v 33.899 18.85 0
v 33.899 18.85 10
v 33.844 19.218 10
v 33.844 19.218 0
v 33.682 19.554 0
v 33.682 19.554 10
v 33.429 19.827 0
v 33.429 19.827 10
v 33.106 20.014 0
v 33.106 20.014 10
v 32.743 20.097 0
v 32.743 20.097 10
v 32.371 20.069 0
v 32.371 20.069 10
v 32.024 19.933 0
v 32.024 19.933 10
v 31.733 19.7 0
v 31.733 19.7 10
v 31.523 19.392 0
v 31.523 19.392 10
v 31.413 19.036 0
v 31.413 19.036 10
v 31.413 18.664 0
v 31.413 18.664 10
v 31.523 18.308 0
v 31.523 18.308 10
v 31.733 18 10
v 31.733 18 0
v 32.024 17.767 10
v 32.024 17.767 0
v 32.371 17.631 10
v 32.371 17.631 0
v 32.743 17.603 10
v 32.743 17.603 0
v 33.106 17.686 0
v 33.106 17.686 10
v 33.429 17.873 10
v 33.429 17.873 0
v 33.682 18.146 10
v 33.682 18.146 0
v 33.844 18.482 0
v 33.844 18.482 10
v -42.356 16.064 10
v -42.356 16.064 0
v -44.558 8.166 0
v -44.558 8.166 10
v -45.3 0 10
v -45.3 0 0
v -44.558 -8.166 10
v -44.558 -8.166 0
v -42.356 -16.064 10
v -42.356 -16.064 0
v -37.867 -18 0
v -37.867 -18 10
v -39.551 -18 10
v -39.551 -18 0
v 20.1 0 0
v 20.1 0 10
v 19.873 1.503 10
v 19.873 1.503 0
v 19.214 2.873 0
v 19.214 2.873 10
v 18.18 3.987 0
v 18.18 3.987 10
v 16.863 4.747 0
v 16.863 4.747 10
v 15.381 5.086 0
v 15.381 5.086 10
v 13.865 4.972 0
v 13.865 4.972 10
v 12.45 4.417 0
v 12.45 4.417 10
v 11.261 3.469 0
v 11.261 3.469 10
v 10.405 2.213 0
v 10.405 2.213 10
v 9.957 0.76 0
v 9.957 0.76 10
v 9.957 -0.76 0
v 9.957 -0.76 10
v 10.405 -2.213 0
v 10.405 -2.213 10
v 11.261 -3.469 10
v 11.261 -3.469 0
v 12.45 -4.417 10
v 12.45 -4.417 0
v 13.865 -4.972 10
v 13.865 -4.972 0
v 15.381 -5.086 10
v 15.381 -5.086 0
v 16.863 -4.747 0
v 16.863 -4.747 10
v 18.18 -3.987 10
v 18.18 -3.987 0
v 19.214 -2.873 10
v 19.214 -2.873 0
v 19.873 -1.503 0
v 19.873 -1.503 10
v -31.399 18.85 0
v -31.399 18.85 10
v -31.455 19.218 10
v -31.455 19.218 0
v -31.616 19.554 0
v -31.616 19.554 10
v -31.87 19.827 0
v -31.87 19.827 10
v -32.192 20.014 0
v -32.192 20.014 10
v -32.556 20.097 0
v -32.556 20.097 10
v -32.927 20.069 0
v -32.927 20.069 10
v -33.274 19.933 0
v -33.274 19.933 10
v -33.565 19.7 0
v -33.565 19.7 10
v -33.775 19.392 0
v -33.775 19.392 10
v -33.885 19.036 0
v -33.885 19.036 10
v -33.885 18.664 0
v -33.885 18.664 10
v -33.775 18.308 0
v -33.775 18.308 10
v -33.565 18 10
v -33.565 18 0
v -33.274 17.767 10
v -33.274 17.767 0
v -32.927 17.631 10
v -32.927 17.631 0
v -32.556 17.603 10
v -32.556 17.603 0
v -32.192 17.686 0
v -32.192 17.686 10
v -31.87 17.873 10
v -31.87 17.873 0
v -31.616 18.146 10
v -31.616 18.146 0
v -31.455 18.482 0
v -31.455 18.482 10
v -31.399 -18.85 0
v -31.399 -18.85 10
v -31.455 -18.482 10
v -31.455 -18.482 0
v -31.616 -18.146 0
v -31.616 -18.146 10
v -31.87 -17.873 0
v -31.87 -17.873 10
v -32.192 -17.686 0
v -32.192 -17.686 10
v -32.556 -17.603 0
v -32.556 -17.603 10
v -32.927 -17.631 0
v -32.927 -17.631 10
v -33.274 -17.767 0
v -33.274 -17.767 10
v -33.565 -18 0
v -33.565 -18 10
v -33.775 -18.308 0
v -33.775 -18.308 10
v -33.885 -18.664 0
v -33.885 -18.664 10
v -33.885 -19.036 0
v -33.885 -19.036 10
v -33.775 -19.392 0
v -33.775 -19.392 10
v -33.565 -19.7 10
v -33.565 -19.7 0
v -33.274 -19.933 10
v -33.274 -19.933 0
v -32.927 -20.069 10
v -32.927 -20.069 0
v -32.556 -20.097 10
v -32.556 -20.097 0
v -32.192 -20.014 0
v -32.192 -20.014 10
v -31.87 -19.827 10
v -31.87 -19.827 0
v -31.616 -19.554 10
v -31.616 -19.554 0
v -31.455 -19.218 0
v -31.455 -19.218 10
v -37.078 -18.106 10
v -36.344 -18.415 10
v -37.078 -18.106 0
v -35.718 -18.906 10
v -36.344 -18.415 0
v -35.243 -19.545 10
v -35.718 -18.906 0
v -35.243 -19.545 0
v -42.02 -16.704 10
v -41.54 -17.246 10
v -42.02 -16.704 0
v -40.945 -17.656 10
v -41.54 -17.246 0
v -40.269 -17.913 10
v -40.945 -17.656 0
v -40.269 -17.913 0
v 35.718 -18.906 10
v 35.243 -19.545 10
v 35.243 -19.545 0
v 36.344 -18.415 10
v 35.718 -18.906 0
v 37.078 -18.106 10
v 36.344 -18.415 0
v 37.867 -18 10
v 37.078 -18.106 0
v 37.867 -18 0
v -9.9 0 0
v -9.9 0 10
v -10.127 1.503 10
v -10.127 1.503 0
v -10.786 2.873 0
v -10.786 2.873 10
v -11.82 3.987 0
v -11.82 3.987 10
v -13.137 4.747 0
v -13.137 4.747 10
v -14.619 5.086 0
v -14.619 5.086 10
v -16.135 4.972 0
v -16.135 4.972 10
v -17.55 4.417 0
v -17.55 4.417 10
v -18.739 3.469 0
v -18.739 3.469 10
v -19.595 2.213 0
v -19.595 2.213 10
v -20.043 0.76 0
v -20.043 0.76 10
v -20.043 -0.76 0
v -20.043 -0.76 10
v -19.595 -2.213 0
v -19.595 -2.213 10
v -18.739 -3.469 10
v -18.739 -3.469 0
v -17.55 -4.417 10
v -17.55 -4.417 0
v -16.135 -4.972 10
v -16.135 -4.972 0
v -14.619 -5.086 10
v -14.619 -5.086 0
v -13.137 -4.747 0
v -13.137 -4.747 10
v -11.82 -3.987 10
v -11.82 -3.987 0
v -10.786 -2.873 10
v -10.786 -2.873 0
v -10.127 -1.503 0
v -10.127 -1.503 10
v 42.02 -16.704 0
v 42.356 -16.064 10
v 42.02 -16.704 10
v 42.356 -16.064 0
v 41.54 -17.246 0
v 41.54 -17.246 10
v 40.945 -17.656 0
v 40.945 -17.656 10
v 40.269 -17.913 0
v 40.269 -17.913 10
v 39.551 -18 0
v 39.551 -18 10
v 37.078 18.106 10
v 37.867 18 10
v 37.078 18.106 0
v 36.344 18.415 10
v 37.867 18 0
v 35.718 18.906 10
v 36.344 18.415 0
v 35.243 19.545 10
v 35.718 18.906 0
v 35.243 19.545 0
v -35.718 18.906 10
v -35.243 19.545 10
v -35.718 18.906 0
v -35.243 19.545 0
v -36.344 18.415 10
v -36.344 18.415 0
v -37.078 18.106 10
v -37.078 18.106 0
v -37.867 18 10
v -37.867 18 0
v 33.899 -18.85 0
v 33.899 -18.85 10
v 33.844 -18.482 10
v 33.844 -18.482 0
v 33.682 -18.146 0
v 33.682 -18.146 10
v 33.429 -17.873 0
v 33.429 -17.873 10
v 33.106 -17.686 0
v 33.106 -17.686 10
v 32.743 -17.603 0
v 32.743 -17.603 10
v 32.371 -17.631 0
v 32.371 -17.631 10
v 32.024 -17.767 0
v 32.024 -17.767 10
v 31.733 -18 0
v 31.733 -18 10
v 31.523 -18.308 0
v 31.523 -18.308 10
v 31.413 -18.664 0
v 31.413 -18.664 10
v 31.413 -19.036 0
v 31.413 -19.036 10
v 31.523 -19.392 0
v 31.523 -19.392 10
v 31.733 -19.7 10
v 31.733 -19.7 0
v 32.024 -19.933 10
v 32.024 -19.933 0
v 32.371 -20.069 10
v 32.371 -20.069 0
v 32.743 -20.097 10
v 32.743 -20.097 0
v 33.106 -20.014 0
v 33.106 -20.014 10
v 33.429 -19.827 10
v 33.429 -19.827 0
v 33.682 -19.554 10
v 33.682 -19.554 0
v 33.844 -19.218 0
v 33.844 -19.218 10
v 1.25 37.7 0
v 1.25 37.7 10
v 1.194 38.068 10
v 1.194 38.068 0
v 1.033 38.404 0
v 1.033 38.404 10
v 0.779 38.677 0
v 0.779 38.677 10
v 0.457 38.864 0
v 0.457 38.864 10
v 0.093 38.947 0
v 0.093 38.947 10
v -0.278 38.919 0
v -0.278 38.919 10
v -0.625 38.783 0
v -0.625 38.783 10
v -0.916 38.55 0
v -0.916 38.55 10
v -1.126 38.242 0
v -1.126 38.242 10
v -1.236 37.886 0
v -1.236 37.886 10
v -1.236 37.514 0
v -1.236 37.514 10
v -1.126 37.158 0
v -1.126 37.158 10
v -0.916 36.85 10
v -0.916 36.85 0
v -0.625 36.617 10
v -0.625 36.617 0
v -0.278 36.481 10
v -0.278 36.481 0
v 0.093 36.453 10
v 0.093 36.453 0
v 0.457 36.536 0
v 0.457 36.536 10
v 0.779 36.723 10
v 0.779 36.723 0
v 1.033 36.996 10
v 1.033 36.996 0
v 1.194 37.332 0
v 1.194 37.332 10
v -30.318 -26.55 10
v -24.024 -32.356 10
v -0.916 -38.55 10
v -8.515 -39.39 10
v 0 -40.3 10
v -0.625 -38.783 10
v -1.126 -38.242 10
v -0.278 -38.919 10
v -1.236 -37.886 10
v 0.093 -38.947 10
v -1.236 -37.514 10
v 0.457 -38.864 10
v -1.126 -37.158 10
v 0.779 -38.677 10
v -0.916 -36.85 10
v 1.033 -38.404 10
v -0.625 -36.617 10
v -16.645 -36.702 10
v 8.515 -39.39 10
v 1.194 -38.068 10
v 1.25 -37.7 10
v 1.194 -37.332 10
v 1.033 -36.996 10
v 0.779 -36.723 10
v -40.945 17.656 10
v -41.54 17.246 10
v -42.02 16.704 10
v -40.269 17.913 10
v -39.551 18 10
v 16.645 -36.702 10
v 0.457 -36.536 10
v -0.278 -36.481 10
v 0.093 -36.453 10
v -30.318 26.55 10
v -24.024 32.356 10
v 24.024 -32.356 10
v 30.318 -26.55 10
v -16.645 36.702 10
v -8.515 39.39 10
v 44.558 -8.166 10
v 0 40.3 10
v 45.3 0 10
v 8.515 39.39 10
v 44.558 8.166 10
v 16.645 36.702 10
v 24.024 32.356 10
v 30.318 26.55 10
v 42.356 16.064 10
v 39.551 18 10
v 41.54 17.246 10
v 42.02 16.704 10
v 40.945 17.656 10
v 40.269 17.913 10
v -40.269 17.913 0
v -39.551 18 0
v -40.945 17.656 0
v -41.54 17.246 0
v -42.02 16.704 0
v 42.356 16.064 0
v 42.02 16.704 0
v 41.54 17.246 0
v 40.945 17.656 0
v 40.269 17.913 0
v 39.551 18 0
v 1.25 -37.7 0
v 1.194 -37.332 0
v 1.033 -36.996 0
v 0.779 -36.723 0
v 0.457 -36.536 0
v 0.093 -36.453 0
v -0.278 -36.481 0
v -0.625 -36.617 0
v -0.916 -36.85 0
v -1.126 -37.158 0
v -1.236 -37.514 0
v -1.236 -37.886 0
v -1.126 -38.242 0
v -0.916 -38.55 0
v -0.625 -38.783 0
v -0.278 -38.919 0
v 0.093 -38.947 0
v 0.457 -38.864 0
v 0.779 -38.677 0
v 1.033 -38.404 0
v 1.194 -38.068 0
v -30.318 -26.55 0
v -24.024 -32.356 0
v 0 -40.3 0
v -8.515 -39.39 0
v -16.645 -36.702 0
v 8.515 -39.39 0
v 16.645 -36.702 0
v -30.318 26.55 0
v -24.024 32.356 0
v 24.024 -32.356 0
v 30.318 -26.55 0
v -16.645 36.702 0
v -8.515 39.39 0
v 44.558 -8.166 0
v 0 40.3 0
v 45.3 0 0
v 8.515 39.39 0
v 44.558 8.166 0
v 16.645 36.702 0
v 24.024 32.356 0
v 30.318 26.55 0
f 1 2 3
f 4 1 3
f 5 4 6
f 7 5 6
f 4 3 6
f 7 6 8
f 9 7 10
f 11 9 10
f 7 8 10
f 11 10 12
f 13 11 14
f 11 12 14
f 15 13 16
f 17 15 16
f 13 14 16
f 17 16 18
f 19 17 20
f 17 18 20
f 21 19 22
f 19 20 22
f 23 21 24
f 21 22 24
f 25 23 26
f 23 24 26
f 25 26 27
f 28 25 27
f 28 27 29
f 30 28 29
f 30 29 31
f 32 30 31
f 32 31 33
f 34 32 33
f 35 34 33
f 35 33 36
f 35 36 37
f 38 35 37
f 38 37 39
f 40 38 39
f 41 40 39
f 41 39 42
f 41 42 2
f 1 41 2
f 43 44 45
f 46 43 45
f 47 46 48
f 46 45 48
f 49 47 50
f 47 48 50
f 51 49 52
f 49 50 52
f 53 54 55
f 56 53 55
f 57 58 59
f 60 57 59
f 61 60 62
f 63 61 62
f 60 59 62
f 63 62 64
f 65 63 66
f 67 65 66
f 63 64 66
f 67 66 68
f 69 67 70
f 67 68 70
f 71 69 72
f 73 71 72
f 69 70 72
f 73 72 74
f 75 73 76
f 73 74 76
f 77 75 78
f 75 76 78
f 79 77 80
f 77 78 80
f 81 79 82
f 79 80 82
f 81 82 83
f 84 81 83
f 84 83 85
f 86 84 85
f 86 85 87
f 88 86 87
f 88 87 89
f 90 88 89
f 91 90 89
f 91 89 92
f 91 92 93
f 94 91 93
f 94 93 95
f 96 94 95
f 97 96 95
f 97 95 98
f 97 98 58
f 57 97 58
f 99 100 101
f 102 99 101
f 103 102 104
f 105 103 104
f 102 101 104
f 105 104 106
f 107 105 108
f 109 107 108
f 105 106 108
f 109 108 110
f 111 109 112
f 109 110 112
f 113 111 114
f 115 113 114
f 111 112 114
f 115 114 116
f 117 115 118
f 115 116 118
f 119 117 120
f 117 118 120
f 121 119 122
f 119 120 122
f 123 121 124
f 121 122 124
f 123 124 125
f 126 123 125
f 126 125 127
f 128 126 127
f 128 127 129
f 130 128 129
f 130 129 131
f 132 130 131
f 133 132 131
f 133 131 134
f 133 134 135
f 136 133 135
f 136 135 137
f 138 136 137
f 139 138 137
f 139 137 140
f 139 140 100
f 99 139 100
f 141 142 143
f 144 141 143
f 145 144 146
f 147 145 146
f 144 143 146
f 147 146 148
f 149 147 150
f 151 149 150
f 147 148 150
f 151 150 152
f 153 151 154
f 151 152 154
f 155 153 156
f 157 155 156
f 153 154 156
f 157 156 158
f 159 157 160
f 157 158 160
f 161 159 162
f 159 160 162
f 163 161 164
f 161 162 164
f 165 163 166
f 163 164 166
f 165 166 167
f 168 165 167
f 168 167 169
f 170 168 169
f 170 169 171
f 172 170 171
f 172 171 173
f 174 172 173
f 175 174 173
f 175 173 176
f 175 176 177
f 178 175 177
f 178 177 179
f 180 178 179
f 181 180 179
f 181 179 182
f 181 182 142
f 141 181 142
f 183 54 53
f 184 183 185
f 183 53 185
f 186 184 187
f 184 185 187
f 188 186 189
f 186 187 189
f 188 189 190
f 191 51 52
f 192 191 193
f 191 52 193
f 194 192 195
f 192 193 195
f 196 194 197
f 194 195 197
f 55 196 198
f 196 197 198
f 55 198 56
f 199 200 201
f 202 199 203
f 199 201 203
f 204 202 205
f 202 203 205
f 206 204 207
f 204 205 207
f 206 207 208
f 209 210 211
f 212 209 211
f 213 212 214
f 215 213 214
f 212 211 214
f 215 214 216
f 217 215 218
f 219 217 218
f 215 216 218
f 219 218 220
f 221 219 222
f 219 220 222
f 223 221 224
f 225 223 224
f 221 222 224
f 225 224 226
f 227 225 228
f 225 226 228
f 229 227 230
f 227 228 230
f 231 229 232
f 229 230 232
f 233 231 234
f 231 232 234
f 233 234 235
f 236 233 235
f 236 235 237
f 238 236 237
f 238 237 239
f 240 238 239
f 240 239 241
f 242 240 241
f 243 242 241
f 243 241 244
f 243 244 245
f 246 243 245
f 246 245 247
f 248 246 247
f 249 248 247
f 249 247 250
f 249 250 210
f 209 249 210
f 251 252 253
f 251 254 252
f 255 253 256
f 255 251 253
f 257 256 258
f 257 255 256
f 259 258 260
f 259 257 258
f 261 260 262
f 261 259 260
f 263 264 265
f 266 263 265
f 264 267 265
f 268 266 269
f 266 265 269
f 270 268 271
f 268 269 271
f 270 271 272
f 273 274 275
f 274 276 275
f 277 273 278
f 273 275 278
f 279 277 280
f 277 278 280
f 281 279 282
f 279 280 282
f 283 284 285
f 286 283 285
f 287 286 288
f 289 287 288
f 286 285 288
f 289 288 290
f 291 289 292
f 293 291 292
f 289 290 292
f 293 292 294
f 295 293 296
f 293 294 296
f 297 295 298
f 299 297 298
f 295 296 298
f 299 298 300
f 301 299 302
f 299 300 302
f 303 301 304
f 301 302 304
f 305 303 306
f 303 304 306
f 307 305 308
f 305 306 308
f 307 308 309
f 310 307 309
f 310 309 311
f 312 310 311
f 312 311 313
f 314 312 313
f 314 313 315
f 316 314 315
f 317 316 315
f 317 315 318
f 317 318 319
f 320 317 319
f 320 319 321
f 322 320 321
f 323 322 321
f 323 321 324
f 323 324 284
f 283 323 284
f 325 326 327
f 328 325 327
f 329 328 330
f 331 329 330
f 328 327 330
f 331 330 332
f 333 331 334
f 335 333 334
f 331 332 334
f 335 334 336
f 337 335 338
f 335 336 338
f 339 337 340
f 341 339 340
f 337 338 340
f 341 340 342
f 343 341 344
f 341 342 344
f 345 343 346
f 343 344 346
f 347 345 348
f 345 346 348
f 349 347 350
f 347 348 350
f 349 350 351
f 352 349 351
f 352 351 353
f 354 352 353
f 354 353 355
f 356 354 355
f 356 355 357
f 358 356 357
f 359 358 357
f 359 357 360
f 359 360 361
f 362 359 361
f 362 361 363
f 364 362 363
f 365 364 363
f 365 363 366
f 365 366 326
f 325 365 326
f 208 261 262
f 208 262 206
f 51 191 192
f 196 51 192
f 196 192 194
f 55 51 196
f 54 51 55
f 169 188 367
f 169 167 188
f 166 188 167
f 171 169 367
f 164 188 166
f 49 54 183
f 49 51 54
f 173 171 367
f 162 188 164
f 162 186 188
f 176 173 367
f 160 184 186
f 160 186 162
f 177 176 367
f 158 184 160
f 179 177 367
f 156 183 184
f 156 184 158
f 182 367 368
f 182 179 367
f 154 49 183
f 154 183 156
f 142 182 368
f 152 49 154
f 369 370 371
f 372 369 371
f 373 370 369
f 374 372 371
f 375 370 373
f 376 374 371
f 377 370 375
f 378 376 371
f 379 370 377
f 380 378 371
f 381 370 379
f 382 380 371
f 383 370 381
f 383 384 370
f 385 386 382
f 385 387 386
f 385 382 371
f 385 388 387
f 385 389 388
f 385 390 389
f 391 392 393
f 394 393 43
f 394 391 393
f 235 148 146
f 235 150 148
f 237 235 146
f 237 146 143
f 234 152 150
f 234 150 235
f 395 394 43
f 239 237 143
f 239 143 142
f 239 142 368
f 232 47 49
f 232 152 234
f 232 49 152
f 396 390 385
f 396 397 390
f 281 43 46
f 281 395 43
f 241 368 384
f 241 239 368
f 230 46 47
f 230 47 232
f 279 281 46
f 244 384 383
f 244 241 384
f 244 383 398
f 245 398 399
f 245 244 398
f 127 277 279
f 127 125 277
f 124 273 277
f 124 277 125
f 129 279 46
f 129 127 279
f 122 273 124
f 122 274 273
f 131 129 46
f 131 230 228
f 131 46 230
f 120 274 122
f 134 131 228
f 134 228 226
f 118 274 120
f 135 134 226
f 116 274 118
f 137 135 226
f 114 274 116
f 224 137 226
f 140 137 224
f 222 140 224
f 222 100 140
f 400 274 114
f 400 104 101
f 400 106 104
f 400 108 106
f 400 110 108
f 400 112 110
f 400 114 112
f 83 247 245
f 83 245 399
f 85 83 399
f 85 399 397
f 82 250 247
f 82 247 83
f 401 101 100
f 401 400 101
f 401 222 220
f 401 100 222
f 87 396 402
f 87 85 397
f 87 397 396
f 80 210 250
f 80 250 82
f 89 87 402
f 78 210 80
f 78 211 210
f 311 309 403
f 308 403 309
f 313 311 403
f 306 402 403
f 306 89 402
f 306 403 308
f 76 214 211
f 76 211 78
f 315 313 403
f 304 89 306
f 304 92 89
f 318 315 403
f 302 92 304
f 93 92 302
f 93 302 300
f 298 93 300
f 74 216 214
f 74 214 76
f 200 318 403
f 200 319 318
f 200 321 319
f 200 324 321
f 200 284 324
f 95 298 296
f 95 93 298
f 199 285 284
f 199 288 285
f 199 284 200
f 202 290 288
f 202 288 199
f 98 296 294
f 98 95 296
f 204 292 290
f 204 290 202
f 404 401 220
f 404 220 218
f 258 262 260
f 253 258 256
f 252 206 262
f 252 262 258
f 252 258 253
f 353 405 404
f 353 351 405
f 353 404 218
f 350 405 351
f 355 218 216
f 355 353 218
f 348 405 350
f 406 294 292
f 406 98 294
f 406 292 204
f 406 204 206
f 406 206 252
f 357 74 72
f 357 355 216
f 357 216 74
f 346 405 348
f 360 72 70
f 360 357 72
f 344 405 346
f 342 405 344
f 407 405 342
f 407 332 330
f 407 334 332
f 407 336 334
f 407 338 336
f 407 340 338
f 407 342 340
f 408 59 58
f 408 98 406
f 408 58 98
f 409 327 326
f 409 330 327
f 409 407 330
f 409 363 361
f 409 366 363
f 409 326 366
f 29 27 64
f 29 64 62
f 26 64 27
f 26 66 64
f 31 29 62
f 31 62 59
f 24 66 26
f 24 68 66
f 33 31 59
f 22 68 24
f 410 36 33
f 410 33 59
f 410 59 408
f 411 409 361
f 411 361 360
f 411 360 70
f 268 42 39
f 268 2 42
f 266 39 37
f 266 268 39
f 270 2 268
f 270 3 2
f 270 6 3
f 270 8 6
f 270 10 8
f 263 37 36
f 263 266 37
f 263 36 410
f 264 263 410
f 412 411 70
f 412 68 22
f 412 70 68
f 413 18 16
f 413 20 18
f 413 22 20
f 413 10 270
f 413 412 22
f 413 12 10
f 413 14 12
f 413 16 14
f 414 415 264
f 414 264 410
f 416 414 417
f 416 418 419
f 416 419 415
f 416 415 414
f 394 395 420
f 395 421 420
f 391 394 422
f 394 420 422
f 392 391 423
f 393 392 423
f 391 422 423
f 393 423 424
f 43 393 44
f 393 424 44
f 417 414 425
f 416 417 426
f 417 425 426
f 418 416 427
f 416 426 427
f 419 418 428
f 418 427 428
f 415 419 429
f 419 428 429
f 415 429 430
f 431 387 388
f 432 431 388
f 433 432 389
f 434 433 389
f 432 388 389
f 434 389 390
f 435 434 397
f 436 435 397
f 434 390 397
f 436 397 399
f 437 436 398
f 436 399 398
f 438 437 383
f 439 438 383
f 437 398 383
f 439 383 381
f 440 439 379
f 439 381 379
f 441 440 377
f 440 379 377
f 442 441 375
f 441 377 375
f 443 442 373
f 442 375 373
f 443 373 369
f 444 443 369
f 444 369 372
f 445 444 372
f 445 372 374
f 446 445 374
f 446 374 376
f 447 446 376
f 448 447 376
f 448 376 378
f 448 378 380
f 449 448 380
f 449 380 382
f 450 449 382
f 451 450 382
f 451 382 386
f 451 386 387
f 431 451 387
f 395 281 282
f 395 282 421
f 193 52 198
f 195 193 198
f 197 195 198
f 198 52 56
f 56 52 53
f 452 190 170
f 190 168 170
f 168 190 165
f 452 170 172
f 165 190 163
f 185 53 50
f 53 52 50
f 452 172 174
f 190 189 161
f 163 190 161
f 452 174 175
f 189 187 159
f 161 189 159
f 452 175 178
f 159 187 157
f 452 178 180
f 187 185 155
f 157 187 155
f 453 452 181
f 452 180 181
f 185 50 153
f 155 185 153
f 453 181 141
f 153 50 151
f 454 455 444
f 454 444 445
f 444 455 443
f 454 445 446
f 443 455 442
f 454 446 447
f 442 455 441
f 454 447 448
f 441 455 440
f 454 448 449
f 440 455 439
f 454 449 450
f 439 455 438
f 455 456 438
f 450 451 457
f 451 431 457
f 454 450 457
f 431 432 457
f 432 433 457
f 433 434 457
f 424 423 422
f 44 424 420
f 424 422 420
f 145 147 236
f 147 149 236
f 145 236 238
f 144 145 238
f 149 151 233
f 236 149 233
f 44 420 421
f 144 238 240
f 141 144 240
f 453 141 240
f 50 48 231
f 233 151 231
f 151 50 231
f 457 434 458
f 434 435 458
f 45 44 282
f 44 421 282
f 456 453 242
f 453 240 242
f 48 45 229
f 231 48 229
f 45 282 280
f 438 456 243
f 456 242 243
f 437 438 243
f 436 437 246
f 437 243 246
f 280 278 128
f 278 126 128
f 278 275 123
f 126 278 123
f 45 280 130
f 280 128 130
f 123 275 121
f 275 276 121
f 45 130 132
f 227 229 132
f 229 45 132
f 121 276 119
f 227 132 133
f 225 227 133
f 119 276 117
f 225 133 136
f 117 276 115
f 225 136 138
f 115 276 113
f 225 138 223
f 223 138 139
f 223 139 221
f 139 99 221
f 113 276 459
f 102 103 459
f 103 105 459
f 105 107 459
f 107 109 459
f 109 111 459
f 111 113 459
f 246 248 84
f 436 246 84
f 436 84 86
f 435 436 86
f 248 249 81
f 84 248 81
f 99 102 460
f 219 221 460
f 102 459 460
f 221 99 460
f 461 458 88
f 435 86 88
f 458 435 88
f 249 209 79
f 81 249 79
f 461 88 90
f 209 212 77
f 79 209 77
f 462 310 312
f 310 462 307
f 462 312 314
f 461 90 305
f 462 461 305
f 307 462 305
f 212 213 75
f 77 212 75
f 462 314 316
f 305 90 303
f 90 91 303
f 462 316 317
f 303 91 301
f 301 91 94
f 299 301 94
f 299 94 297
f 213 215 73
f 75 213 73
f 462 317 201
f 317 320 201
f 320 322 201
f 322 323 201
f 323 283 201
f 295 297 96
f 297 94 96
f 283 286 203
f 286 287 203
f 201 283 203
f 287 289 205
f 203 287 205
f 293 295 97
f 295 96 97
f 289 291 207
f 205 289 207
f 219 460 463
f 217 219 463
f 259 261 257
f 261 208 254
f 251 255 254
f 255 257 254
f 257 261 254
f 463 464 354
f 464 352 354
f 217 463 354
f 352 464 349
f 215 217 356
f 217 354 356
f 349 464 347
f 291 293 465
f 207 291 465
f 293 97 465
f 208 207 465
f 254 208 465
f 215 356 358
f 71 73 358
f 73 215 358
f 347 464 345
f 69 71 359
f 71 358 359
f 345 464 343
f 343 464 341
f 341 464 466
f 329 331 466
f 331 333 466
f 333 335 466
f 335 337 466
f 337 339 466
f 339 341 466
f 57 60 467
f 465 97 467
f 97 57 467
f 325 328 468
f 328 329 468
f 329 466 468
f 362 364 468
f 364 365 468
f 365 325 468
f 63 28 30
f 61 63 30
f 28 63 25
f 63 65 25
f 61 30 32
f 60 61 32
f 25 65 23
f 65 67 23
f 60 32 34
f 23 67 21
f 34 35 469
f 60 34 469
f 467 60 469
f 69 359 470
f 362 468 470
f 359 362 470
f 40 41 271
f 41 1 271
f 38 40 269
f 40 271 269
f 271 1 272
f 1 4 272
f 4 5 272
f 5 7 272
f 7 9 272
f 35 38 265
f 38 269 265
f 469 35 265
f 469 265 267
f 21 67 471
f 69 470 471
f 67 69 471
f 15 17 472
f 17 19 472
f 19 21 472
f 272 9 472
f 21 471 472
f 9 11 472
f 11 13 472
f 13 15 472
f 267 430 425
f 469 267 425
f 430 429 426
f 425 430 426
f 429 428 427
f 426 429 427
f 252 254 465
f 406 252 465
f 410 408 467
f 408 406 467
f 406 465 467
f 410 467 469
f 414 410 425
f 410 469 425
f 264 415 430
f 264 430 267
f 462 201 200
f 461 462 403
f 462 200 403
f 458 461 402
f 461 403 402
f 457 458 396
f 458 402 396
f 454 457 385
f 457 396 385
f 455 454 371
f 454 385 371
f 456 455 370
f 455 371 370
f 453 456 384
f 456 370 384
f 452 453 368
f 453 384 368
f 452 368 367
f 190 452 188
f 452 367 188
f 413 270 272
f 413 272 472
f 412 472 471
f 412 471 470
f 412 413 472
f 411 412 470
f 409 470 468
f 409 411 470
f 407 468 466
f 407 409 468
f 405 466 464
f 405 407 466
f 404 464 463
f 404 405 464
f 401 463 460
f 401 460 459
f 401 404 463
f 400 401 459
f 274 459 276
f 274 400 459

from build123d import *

# Parameters (mm, degrees)
SKETCH_1_R          = 45.3
EXTRUDE_1_DEPTH     = 10
CUT_EXTRUDE_1_DEPTH = 11
FILLET_1_R          = 3
SKETCH_3_R          = 1.25
CUT_EXTRUDE_2_DEPTH = 11
SKETCH_4_R          = 5.1
CUT_EXTRUDE_3_DEPTH = 11


with BuildPart() as part:
    # 草图1 → 凸台-拉伸1 (new body)
    with BuildSketch(Plane.XY):
        Circle(SKETCH_1_R)
    extrude(amount=EXTRUDE_1_DEPTH)

    # 草图2 → 切除-拉伸1 (cut, through all)
    with BuildSketch(Plane.XY.offset(10)):
        with BuildLine():
            Line((-36.056760808, 18), (-41.570301899, 18))
            ThreePointArc((-41.570301899, 18), (0, 45.3), (41.570301899, 18))
            Line((41.570301899, 18), (36.056760808, 18))
            ThreePointArc((36.056760808, 18), (0, 40.3), (-36.056760808, 18))
        make_face()
        with BuildLine():
            Line((-36.056760808, -18), (-41.734622438, -18))
            ThreePointArc((-41.734622438, -18), (0, -45.450838386), (41.734622438, -18))
            Line((41.734622438, -18), (36.056760808, -18))
            ThreePointArc((36.056760808, -18), (0, -40.3), (-36.056760808, -18))
        make_face()
    extrude(amount=-CUT_EXTRUDE_1_DEPTH, mode=Mode.SUBTRACT)

    # 圆角1
    fillet_1_edges = [part.edges().sort_by_distance(p)[0] for p in [
        (36.056760808, 18, 5),
        (-36.056760808, 18, 5),
        (-41.570301899, 18, 5),
        (41.570301899, 18, 5),
        (41.570301899, -18, 5),
        (36.056760808, -18, 5),
        (-41.570301899, -18, 5),
        (-36.056760808, -18, 5),
    ]]
    fillet(fillet_1_edges, radius=FILLET_1_R)

    # 草图3 → 切除-拉伸2 (cut, through all)
    with BuildSketch(Plane.XY.offset(10)):
        with Locations((0, 37.7)):
            Circle(SKETCH_3_R)
        with Locations((32.649157723, 18.85)):
            Circle(SKETCH_3_R)
        with Locations((32.649157723, -18.85)):
            Circle(SKETCH_3_R)
        with Locations((0, -37.7)):
            Circle(SKETCH_3_R)
        with Locations((-32.649157723, -18.85)):
            Circle(SKETCH_3_R)
        with Locations((-32.649157723, 18.85)):
            Circle(SKETCH_3_R)
    extrude(amount=-CUT_EXTRUDE_2_DEPTH, mode=Mode.SUBTRACT)

    # 草图4 → 切除-拉伸3 (cut, through all)
    with BuildSketch(Plane.XY.offset(10)):
        with Locations((-15, 0)):
            Circle(SKETCH_4_R)
        with Locations((15, 0)):
            Circle(SKETCH_4_R)
    extrude(amount=-CUT_EXTRUDE_3_DEPTH, mode=Mode.SUBTRACT)


solid = part.part
